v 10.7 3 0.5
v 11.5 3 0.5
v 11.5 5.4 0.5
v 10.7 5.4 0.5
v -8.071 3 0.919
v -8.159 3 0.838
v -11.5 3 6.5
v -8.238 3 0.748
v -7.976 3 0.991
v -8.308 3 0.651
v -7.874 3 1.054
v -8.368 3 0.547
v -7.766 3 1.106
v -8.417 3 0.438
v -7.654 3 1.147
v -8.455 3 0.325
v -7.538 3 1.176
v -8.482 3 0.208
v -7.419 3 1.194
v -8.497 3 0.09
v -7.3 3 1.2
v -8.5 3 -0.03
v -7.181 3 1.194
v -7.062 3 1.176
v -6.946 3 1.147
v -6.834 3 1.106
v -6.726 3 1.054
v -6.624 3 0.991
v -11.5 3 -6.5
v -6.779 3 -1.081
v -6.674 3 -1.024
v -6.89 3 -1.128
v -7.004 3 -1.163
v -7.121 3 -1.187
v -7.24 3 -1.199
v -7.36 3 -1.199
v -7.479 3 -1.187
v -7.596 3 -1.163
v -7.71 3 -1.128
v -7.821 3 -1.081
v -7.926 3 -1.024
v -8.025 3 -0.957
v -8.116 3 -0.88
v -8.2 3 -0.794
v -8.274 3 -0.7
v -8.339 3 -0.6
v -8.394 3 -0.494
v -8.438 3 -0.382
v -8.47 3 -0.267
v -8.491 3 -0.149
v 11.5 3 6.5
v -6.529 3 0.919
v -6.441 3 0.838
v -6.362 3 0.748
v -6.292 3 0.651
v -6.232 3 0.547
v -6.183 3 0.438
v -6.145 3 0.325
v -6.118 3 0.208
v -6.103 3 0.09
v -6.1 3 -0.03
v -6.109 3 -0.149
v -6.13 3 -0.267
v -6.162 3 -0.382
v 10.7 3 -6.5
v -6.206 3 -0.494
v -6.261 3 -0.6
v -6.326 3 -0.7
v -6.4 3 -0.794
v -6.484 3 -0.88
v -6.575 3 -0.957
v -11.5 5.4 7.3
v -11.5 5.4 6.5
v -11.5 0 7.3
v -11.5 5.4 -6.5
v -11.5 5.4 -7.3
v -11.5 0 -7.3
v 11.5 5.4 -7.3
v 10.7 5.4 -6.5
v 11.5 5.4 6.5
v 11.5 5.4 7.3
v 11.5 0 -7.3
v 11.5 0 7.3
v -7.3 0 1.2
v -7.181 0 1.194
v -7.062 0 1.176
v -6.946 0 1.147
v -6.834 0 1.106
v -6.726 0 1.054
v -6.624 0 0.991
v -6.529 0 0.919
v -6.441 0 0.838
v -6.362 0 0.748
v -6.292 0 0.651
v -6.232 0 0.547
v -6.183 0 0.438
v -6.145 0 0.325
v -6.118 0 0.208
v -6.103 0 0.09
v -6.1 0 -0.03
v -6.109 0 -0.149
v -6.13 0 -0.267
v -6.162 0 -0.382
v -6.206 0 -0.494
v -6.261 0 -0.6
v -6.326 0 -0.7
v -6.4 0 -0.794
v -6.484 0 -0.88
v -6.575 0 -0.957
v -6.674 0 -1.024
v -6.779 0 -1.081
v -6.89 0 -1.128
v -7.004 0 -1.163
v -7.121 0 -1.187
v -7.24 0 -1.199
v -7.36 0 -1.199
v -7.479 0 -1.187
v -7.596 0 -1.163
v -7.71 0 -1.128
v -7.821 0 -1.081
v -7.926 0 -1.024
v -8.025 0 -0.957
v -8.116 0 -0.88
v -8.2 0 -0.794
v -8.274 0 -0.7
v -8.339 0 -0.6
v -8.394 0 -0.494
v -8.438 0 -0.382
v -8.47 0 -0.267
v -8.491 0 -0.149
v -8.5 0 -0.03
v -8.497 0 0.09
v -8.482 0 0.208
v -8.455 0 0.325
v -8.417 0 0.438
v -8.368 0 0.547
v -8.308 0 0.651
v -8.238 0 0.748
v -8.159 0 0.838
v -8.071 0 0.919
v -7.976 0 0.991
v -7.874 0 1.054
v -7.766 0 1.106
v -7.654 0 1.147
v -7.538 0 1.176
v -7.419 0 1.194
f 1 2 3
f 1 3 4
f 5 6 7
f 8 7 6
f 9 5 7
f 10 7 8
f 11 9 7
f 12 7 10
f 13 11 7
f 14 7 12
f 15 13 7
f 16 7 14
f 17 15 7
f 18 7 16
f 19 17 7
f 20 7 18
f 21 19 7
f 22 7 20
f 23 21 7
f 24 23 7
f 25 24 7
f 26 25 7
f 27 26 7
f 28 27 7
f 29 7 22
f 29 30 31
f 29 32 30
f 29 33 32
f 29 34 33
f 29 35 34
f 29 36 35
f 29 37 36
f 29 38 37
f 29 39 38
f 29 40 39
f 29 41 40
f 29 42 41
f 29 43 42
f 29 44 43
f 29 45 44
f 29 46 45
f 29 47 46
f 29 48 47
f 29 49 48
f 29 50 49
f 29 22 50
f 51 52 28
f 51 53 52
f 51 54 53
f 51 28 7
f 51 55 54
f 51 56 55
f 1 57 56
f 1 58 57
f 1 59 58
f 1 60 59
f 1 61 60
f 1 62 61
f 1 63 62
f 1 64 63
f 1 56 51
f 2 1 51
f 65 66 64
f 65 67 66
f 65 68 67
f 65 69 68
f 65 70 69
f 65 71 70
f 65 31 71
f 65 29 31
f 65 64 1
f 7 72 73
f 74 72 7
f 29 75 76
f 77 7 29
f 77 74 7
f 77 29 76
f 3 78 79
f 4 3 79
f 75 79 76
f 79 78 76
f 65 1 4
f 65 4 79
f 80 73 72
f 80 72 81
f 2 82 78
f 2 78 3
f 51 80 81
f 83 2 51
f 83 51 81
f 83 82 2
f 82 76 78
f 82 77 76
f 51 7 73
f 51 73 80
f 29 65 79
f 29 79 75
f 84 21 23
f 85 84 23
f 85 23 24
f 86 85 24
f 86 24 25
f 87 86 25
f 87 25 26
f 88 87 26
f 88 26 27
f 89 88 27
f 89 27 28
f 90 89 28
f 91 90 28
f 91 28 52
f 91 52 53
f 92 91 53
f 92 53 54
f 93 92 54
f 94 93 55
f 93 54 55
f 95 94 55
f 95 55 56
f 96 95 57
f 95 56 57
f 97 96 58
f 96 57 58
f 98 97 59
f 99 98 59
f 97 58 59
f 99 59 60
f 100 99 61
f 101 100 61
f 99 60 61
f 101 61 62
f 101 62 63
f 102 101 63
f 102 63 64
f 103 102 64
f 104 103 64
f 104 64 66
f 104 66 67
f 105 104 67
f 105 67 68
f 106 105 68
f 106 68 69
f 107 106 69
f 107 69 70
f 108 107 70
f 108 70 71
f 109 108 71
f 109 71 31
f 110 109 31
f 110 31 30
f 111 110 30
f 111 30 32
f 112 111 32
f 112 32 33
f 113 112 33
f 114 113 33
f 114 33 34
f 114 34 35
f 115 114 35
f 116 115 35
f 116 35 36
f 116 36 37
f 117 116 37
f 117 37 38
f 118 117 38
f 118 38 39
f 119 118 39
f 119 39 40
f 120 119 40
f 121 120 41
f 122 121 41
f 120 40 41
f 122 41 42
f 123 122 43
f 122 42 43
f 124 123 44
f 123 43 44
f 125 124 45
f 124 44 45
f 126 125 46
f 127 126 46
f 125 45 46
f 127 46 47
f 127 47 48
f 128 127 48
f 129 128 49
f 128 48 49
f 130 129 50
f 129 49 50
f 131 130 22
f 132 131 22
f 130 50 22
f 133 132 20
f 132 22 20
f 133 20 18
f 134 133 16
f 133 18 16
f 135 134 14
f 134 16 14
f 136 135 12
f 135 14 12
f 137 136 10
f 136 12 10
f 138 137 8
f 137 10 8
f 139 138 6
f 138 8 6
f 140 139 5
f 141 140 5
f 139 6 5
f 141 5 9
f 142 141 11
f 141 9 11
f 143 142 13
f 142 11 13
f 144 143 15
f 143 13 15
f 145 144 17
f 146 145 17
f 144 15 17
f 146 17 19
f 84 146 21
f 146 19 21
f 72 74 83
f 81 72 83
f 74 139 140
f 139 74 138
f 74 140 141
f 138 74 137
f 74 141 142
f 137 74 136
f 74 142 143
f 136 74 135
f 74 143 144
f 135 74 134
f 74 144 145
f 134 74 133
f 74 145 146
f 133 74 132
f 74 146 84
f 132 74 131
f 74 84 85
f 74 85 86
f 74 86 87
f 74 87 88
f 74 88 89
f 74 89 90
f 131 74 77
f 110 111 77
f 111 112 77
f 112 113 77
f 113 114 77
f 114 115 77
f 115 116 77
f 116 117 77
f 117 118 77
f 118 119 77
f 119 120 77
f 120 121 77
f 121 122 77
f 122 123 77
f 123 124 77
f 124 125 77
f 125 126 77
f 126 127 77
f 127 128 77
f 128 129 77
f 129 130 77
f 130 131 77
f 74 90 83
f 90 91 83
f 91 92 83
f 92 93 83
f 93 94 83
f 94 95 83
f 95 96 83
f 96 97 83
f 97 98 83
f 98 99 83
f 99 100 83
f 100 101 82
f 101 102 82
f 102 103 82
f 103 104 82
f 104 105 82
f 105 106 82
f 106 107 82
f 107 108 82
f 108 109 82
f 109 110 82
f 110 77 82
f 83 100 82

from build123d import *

# Parameters (mm, degrees)
SKETCH1_W           = 23
SKETCH1_H           = 14.6
BOSS_EXTRUDE1_DEPTH = 3
SKETCH2_R           = 1.2
CUT_EXTRUDE1_DEPTH  = 14.947759677
SKETCH3_W           = 23
SKETCH3_H           = 0.8
BOSS_EXTRUDE2_DEPTH = 2.4


with BuildPart() as part:
    # Sketch1 → Boss-Extrude1 (new body)
    with BuildSketch(Plane(origin=(0, 0, 0), x_dir=(1, 0, 0), z_dir=(0, 1, 0))):
        Rectangle(SKETCH1_W, SKETCH1_H)
    extrude(amount=BOSS_EXTRUDE1_DEPTH)

    # Sketch2 → Cut-Extrude1 (cut, through all)
    with BuildSketch(Plane(origin=(0, 3, 0), x_dir=(1, 0, 0), z_dir=(0, 1, 0))):
        with Locations(Location((-7.3, 0, 0), (0, 0, 270))):
            Circle(SKETCH2_R)
    extrude(amount=-CUT_EXTRUDE1_DEPTH, mode=Mode.SUBTRACT)

    # Sketch3 → Boss-Extrude2 (add)
    with BuildSketch(Plane(origin=(0, 3, 0), x_dir=(1, 0, 0), z_dir=(0, 1, 0))):
        Polygon((-11.5, 7.3), (11.5, 7.3), (11.5, -0.5), (10.7, -0.5), (10.7, 6.5), (-11.5, 6.5), align=None)
        with Locations((0, -6.9)):
            Rectangle(SKETCH3_W, SKETCH3_H)
    extrude(amount=BOSS_EXTRUDE2_DEPTH)


solid = part.part
